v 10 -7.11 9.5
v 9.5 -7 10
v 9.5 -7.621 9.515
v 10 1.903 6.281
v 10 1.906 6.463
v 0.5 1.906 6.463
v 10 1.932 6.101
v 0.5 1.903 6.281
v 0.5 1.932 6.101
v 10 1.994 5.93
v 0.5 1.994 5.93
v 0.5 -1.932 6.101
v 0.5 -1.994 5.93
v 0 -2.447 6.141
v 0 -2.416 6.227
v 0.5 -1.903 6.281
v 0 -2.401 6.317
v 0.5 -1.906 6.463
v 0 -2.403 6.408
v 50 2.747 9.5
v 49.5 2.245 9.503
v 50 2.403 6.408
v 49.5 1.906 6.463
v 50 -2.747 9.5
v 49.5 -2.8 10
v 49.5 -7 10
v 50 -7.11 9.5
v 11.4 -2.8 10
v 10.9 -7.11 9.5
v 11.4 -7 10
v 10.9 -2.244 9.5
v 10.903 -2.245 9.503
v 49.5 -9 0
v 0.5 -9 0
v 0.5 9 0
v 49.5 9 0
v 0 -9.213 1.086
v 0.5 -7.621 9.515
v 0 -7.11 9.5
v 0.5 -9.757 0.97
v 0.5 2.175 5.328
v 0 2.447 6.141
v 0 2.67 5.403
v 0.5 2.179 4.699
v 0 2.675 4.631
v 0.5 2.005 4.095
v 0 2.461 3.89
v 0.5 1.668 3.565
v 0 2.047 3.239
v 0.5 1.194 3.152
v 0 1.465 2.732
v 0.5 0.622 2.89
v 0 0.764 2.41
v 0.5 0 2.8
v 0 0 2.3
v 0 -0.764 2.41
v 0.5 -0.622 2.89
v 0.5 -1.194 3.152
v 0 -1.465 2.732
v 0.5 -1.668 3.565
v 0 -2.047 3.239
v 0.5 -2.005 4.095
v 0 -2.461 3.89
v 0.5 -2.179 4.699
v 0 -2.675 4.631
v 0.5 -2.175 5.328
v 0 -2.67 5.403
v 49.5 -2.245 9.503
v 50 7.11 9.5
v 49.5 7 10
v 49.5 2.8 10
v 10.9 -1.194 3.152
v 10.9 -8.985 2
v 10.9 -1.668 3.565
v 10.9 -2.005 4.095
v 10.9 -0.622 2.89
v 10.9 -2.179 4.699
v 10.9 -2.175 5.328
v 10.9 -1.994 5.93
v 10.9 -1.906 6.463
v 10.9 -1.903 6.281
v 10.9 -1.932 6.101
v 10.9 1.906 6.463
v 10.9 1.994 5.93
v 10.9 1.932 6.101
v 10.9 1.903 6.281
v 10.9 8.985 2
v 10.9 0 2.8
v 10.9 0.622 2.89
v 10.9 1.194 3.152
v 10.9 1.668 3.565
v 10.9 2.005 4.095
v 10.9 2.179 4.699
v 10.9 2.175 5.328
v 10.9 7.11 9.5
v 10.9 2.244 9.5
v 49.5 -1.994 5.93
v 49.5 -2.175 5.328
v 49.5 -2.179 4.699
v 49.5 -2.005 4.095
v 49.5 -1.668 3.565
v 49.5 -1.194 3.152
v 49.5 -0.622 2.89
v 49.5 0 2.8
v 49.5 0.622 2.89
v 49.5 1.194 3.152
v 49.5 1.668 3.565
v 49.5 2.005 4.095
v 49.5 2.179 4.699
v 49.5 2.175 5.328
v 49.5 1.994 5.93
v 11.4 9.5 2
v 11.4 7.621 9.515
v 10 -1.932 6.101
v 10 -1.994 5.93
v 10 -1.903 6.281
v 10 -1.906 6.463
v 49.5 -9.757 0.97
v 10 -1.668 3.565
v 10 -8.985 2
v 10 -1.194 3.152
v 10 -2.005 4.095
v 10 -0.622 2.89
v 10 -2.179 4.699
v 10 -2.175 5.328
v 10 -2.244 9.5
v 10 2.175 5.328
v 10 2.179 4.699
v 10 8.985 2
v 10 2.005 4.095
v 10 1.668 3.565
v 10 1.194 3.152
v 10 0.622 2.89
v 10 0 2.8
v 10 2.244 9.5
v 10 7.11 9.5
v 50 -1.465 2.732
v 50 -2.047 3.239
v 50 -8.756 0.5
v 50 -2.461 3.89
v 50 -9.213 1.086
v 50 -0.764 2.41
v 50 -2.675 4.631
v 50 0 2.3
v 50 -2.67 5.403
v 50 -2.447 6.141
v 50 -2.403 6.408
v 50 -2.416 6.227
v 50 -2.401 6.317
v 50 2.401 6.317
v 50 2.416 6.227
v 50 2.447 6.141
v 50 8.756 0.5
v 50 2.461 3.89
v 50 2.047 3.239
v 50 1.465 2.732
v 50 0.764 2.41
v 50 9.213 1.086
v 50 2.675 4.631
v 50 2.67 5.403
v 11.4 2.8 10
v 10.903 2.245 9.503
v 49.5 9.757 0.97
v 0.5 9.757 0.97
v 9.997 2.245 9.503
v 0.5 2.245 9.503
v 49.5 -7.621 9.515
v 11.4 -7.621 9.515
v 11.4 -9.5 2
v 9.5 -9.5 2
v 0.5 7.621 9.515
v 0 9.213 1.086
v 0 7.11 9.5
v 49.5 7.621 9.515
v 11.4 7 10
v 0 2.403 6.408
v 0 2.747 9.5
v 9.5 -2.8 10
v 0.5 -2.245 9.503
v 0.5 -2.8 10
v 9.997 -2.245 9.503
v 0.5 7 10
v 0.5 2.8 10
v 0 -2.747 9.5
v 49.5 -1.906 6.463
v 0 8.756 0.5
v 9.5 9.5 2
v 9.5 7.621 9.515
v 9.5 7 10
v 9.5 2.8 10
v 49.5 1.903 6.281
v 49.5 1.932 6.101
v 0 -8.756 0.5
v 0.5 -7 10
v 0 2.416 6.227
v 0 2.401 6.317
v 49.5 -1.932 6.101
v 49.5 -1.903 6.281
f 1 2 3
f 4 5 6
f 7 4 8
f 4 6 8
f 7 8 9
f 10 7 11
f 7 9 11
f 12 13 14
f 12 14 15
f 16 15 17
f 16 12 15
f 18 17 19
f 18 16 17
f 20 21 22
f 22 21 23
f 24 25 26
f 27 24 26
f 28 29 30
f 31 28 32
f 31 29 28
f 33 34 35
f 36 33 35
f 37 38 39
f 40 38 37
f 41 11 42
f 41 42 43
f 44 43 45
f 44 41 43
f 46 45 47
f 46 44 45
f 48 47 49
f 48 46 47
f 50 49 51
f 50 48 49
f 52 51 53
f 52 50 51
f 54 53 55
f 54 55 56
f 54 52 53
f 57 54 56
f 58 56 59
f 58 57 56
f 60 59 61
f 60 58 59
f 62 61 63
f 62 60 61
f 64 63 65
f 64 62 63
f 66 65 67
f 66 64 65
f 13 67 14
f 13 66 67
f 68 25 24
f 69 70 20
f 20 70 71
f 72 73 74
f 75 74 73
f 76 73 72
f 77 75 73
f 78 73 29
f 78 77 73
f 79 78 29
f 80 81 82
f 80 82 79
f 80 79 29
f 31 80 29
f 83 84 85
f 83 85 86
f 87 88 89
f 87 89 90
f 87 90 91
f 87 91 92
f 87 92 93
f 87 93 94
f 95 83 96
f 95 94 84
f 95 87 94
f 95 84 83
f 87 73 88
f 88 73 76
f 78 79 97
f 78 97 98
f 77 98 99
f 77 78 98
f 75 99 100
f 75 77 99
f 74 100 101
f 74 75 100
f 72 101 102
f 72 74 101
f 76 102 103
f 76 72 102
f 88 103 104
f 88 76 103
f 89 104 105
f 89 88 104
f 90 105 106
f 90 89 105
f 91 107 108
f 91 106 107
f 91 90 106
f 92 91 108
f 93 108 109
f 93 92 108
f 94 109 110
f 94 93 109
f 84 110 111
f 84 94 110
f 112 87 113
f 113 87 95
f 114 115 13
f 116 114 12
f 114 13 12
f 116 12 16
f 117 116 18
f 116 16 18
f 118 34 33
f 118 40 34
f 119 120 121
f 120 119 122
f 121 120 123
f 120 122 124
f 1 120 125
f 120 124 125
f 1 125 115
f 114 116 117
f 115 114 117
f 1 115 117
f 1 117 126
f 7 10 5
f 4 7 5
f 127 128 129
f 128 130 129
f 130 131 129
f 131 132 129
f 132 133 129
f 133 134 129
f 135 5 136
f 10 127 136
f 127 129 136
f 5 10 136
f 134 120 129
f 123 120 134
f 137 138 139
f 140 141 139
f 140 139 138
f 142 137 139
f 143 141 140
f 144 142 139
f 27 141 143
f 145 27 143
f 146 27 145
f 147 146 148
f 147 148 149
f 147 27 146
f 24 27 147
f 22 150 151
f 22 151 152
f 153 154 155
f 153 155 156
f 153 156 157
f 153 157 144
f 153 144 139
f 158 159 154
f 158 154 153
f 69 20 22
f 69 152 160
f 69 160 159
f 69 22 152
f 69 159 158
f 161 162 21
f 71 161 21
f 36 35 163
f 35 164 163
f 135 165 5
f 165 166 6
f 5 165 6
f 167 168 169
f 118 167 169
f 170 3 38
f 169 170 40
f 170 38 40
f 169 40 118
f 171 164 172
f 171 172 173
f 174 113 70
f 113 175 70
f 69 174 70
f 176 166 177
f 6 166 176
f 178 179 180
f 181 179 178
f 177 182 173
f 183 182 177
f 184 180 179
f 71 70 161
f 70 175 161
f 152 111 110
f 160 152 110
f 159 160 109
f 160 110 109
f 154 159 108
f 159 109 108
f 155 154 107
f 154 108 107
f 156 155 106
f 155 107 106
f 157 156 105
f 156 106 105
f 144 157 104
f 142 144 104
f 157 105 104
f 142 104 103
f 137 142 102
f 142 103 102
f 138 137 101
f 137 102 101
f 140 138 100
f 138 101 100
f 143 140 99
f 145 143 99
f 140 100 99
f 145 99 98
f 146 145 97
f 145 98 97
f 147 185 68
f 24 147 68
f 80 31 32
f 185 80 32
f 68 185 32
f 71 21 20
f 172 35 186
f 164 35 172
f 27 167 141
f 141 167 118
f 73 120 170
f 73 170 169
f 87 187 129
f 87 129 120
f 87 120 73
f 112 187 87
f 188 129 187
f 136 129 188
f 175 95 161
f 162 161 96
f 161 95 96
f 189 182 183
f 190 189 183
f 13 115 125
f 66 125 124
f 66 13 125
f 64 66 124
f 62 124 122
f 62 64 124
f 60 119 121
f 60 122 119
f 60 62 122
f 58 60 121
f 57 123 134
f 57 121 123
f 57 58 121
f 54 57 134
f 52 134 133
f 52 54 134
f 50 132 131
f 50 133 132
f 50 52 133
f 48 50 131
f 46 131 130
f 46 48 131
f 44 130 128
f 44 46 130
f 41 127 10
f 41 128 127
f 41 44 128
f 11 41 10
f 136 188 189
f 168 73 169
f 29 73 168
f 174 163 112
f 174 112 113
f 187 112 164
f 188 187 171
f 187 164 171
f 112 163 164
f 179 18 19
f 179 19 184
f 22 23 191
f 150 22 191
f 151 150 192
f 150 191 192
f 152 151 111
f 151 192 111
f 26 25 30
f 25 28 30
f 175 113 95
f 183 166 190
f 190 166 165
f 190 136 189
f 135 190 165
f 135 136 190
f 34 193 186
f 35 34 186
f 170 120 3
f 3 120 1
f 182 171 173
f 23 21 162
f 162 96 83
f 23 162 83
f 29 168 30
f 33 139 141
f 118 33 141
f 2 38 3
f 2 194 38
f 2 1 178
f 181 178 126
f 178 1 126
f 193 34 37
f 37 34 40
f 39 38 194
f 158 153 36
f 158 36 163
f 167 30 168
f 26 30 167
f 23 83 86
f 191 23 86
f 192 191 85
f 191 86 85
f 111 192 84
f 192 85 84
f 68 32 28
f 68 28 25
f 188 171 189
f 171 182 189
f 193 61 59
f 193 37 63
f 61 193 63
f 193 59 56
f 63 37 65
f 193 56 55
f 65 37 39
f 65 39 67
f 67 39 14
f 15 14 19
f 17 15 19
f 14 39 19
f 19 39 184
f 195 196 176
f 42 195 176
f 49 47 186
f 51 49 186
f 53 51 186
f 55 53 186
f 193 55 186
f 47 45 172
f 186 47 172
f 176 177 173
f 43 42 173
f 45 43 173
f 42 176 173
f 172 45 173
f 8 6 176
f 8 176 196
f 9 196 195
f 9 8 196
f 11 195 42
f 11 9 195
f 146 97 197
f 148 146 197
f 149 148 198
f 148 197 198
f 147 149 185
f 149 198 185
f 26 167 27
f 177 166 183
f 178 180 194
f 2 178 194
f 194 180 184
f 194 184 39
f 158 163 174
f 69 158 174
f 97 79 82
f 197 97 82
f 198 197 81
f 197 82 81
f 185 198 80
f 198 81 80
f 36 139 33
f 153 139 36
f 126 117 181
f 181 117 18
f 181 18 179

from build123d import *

# Parameters (mm, degrees)
PAD_DEPTH         = 50
SKETCH001_W       = 0.9
SKETCH001_H       = 10
POCKET_DEPTH      = 10.001
POCKET_DEPTH_BACK = -10.001
CHAMFER_SIZE      = 1
CHAMFER001_SIZE   = 0.5


with BuildPart() as part:
    # Sketch → Pad (new body)
    with BuildSketch(Plane.YZ):
        with BuildLine():
            Line((-10, 0), (10, 0))
            Line((10, 0), (7.5, 10))
            Line((7.5, 10), (2.3, 10))
            Line((2.3, 10), (1.906144, 6.463458))
            ThreePointArc((1.906144, 6.463458), (1.913219, 6.190714), (1.99375, 5.930033))
            ThreePointArc((-1.99375, 5.930033), (0, 2.8), (1.99375, 5.930033))
            ThreePointArc((-1.99375, 5.930033), (-1.913219, 6.190714), (-1.906144, 6.463458))
            Line((-1.906144, 6.463458), (-2.3, 10))
            Line((-2.3, 10), (-7.5, 10))
            Line((-7.5, 10), (-10, 0))
        make_face()
    extrude(amount=PAD_DEPTH)

    # Sketch001 → Pocket (cut, two sides)
    with BuildSketch(Plane.XZ) as pocket_sk:
        with Locations((10.45, 7)):
            Rectangle(SKETCH001_W, SKETCH001_H)
    extrude(amount=-POCKET_DEPTH, mode=Mode.SUBTRACT)
    extrude(pocket_sk.sketch, amount=-POCKET_DEPTH_BACK, mode=Mode.SUBTRACT)

    # Chamfer
    chamfer_edges = [part.edges().sort_by_distance(p)[0] for p in [
        (25, 10, 0),
        (25, -10, 0),
    ]]
    chamfer(chamfer_edges, length=CHAMFER_SIZE)

    # Chamfer001
    chamfer001_edges = [part.edges().sort_by_distance(p)[0] for p in [
        (50, -8.628732, 5.485071),
        (50, -9.378732, 0.485071),
        (50, -4.9, 10),
        (50, 0, 0),
        (50, -2.103072, 8.231729),
        (50, 9.378732, 0.485071),
        (50, -1.913219, 6.190714),
        (50, 8.628732, 5.485071),
        (50, 0, 2.8),
        (50, 4.9, 10),
        (50, 1.913219, 6.190714),
        (50, 2.103072, 8.231729),
        (0, -8.628732, 5.485071),
        (0, -9.378732, 0.485071),
        (0, -4.9, 10),
        (0, 0, 0),
        (0, -2.103072, 8.231729),
        (0, 9.378732, 0.485071),
        (0, -1.913219, 6.190714),
        (0, 8.628732, 5.485071),
        (0, 0, 2.8),
        (0, 4.9, 10),
        (0, 1.913219, 6.190714),
        (0, 2.103072, 8.231729),
        (5, -7.5, 10),
        (10, -4.9, 10),
        (5, -2.3, 10),
        (5, 2.3, 10),
        (10, 4.9, 10),
        (5, 7.5, 10),
        (10.9, 4.9, 10),
        (30.45, 2.3, 10),
        (30.45, 7.5, 10),
        (10.9, -4.9, 10),
        (30.45, -7.5, 10),
        (30.45, -2.3, 10),
        (10, -8.5, 6),
        (10, 8.5, 6),
        (10.9, 8.5, 6),
        (10.9, -8.5, 6),
    ]]
    chamfer(chamfer001_edges, length=CHAMFER001_SIZE)


solid = part.part
